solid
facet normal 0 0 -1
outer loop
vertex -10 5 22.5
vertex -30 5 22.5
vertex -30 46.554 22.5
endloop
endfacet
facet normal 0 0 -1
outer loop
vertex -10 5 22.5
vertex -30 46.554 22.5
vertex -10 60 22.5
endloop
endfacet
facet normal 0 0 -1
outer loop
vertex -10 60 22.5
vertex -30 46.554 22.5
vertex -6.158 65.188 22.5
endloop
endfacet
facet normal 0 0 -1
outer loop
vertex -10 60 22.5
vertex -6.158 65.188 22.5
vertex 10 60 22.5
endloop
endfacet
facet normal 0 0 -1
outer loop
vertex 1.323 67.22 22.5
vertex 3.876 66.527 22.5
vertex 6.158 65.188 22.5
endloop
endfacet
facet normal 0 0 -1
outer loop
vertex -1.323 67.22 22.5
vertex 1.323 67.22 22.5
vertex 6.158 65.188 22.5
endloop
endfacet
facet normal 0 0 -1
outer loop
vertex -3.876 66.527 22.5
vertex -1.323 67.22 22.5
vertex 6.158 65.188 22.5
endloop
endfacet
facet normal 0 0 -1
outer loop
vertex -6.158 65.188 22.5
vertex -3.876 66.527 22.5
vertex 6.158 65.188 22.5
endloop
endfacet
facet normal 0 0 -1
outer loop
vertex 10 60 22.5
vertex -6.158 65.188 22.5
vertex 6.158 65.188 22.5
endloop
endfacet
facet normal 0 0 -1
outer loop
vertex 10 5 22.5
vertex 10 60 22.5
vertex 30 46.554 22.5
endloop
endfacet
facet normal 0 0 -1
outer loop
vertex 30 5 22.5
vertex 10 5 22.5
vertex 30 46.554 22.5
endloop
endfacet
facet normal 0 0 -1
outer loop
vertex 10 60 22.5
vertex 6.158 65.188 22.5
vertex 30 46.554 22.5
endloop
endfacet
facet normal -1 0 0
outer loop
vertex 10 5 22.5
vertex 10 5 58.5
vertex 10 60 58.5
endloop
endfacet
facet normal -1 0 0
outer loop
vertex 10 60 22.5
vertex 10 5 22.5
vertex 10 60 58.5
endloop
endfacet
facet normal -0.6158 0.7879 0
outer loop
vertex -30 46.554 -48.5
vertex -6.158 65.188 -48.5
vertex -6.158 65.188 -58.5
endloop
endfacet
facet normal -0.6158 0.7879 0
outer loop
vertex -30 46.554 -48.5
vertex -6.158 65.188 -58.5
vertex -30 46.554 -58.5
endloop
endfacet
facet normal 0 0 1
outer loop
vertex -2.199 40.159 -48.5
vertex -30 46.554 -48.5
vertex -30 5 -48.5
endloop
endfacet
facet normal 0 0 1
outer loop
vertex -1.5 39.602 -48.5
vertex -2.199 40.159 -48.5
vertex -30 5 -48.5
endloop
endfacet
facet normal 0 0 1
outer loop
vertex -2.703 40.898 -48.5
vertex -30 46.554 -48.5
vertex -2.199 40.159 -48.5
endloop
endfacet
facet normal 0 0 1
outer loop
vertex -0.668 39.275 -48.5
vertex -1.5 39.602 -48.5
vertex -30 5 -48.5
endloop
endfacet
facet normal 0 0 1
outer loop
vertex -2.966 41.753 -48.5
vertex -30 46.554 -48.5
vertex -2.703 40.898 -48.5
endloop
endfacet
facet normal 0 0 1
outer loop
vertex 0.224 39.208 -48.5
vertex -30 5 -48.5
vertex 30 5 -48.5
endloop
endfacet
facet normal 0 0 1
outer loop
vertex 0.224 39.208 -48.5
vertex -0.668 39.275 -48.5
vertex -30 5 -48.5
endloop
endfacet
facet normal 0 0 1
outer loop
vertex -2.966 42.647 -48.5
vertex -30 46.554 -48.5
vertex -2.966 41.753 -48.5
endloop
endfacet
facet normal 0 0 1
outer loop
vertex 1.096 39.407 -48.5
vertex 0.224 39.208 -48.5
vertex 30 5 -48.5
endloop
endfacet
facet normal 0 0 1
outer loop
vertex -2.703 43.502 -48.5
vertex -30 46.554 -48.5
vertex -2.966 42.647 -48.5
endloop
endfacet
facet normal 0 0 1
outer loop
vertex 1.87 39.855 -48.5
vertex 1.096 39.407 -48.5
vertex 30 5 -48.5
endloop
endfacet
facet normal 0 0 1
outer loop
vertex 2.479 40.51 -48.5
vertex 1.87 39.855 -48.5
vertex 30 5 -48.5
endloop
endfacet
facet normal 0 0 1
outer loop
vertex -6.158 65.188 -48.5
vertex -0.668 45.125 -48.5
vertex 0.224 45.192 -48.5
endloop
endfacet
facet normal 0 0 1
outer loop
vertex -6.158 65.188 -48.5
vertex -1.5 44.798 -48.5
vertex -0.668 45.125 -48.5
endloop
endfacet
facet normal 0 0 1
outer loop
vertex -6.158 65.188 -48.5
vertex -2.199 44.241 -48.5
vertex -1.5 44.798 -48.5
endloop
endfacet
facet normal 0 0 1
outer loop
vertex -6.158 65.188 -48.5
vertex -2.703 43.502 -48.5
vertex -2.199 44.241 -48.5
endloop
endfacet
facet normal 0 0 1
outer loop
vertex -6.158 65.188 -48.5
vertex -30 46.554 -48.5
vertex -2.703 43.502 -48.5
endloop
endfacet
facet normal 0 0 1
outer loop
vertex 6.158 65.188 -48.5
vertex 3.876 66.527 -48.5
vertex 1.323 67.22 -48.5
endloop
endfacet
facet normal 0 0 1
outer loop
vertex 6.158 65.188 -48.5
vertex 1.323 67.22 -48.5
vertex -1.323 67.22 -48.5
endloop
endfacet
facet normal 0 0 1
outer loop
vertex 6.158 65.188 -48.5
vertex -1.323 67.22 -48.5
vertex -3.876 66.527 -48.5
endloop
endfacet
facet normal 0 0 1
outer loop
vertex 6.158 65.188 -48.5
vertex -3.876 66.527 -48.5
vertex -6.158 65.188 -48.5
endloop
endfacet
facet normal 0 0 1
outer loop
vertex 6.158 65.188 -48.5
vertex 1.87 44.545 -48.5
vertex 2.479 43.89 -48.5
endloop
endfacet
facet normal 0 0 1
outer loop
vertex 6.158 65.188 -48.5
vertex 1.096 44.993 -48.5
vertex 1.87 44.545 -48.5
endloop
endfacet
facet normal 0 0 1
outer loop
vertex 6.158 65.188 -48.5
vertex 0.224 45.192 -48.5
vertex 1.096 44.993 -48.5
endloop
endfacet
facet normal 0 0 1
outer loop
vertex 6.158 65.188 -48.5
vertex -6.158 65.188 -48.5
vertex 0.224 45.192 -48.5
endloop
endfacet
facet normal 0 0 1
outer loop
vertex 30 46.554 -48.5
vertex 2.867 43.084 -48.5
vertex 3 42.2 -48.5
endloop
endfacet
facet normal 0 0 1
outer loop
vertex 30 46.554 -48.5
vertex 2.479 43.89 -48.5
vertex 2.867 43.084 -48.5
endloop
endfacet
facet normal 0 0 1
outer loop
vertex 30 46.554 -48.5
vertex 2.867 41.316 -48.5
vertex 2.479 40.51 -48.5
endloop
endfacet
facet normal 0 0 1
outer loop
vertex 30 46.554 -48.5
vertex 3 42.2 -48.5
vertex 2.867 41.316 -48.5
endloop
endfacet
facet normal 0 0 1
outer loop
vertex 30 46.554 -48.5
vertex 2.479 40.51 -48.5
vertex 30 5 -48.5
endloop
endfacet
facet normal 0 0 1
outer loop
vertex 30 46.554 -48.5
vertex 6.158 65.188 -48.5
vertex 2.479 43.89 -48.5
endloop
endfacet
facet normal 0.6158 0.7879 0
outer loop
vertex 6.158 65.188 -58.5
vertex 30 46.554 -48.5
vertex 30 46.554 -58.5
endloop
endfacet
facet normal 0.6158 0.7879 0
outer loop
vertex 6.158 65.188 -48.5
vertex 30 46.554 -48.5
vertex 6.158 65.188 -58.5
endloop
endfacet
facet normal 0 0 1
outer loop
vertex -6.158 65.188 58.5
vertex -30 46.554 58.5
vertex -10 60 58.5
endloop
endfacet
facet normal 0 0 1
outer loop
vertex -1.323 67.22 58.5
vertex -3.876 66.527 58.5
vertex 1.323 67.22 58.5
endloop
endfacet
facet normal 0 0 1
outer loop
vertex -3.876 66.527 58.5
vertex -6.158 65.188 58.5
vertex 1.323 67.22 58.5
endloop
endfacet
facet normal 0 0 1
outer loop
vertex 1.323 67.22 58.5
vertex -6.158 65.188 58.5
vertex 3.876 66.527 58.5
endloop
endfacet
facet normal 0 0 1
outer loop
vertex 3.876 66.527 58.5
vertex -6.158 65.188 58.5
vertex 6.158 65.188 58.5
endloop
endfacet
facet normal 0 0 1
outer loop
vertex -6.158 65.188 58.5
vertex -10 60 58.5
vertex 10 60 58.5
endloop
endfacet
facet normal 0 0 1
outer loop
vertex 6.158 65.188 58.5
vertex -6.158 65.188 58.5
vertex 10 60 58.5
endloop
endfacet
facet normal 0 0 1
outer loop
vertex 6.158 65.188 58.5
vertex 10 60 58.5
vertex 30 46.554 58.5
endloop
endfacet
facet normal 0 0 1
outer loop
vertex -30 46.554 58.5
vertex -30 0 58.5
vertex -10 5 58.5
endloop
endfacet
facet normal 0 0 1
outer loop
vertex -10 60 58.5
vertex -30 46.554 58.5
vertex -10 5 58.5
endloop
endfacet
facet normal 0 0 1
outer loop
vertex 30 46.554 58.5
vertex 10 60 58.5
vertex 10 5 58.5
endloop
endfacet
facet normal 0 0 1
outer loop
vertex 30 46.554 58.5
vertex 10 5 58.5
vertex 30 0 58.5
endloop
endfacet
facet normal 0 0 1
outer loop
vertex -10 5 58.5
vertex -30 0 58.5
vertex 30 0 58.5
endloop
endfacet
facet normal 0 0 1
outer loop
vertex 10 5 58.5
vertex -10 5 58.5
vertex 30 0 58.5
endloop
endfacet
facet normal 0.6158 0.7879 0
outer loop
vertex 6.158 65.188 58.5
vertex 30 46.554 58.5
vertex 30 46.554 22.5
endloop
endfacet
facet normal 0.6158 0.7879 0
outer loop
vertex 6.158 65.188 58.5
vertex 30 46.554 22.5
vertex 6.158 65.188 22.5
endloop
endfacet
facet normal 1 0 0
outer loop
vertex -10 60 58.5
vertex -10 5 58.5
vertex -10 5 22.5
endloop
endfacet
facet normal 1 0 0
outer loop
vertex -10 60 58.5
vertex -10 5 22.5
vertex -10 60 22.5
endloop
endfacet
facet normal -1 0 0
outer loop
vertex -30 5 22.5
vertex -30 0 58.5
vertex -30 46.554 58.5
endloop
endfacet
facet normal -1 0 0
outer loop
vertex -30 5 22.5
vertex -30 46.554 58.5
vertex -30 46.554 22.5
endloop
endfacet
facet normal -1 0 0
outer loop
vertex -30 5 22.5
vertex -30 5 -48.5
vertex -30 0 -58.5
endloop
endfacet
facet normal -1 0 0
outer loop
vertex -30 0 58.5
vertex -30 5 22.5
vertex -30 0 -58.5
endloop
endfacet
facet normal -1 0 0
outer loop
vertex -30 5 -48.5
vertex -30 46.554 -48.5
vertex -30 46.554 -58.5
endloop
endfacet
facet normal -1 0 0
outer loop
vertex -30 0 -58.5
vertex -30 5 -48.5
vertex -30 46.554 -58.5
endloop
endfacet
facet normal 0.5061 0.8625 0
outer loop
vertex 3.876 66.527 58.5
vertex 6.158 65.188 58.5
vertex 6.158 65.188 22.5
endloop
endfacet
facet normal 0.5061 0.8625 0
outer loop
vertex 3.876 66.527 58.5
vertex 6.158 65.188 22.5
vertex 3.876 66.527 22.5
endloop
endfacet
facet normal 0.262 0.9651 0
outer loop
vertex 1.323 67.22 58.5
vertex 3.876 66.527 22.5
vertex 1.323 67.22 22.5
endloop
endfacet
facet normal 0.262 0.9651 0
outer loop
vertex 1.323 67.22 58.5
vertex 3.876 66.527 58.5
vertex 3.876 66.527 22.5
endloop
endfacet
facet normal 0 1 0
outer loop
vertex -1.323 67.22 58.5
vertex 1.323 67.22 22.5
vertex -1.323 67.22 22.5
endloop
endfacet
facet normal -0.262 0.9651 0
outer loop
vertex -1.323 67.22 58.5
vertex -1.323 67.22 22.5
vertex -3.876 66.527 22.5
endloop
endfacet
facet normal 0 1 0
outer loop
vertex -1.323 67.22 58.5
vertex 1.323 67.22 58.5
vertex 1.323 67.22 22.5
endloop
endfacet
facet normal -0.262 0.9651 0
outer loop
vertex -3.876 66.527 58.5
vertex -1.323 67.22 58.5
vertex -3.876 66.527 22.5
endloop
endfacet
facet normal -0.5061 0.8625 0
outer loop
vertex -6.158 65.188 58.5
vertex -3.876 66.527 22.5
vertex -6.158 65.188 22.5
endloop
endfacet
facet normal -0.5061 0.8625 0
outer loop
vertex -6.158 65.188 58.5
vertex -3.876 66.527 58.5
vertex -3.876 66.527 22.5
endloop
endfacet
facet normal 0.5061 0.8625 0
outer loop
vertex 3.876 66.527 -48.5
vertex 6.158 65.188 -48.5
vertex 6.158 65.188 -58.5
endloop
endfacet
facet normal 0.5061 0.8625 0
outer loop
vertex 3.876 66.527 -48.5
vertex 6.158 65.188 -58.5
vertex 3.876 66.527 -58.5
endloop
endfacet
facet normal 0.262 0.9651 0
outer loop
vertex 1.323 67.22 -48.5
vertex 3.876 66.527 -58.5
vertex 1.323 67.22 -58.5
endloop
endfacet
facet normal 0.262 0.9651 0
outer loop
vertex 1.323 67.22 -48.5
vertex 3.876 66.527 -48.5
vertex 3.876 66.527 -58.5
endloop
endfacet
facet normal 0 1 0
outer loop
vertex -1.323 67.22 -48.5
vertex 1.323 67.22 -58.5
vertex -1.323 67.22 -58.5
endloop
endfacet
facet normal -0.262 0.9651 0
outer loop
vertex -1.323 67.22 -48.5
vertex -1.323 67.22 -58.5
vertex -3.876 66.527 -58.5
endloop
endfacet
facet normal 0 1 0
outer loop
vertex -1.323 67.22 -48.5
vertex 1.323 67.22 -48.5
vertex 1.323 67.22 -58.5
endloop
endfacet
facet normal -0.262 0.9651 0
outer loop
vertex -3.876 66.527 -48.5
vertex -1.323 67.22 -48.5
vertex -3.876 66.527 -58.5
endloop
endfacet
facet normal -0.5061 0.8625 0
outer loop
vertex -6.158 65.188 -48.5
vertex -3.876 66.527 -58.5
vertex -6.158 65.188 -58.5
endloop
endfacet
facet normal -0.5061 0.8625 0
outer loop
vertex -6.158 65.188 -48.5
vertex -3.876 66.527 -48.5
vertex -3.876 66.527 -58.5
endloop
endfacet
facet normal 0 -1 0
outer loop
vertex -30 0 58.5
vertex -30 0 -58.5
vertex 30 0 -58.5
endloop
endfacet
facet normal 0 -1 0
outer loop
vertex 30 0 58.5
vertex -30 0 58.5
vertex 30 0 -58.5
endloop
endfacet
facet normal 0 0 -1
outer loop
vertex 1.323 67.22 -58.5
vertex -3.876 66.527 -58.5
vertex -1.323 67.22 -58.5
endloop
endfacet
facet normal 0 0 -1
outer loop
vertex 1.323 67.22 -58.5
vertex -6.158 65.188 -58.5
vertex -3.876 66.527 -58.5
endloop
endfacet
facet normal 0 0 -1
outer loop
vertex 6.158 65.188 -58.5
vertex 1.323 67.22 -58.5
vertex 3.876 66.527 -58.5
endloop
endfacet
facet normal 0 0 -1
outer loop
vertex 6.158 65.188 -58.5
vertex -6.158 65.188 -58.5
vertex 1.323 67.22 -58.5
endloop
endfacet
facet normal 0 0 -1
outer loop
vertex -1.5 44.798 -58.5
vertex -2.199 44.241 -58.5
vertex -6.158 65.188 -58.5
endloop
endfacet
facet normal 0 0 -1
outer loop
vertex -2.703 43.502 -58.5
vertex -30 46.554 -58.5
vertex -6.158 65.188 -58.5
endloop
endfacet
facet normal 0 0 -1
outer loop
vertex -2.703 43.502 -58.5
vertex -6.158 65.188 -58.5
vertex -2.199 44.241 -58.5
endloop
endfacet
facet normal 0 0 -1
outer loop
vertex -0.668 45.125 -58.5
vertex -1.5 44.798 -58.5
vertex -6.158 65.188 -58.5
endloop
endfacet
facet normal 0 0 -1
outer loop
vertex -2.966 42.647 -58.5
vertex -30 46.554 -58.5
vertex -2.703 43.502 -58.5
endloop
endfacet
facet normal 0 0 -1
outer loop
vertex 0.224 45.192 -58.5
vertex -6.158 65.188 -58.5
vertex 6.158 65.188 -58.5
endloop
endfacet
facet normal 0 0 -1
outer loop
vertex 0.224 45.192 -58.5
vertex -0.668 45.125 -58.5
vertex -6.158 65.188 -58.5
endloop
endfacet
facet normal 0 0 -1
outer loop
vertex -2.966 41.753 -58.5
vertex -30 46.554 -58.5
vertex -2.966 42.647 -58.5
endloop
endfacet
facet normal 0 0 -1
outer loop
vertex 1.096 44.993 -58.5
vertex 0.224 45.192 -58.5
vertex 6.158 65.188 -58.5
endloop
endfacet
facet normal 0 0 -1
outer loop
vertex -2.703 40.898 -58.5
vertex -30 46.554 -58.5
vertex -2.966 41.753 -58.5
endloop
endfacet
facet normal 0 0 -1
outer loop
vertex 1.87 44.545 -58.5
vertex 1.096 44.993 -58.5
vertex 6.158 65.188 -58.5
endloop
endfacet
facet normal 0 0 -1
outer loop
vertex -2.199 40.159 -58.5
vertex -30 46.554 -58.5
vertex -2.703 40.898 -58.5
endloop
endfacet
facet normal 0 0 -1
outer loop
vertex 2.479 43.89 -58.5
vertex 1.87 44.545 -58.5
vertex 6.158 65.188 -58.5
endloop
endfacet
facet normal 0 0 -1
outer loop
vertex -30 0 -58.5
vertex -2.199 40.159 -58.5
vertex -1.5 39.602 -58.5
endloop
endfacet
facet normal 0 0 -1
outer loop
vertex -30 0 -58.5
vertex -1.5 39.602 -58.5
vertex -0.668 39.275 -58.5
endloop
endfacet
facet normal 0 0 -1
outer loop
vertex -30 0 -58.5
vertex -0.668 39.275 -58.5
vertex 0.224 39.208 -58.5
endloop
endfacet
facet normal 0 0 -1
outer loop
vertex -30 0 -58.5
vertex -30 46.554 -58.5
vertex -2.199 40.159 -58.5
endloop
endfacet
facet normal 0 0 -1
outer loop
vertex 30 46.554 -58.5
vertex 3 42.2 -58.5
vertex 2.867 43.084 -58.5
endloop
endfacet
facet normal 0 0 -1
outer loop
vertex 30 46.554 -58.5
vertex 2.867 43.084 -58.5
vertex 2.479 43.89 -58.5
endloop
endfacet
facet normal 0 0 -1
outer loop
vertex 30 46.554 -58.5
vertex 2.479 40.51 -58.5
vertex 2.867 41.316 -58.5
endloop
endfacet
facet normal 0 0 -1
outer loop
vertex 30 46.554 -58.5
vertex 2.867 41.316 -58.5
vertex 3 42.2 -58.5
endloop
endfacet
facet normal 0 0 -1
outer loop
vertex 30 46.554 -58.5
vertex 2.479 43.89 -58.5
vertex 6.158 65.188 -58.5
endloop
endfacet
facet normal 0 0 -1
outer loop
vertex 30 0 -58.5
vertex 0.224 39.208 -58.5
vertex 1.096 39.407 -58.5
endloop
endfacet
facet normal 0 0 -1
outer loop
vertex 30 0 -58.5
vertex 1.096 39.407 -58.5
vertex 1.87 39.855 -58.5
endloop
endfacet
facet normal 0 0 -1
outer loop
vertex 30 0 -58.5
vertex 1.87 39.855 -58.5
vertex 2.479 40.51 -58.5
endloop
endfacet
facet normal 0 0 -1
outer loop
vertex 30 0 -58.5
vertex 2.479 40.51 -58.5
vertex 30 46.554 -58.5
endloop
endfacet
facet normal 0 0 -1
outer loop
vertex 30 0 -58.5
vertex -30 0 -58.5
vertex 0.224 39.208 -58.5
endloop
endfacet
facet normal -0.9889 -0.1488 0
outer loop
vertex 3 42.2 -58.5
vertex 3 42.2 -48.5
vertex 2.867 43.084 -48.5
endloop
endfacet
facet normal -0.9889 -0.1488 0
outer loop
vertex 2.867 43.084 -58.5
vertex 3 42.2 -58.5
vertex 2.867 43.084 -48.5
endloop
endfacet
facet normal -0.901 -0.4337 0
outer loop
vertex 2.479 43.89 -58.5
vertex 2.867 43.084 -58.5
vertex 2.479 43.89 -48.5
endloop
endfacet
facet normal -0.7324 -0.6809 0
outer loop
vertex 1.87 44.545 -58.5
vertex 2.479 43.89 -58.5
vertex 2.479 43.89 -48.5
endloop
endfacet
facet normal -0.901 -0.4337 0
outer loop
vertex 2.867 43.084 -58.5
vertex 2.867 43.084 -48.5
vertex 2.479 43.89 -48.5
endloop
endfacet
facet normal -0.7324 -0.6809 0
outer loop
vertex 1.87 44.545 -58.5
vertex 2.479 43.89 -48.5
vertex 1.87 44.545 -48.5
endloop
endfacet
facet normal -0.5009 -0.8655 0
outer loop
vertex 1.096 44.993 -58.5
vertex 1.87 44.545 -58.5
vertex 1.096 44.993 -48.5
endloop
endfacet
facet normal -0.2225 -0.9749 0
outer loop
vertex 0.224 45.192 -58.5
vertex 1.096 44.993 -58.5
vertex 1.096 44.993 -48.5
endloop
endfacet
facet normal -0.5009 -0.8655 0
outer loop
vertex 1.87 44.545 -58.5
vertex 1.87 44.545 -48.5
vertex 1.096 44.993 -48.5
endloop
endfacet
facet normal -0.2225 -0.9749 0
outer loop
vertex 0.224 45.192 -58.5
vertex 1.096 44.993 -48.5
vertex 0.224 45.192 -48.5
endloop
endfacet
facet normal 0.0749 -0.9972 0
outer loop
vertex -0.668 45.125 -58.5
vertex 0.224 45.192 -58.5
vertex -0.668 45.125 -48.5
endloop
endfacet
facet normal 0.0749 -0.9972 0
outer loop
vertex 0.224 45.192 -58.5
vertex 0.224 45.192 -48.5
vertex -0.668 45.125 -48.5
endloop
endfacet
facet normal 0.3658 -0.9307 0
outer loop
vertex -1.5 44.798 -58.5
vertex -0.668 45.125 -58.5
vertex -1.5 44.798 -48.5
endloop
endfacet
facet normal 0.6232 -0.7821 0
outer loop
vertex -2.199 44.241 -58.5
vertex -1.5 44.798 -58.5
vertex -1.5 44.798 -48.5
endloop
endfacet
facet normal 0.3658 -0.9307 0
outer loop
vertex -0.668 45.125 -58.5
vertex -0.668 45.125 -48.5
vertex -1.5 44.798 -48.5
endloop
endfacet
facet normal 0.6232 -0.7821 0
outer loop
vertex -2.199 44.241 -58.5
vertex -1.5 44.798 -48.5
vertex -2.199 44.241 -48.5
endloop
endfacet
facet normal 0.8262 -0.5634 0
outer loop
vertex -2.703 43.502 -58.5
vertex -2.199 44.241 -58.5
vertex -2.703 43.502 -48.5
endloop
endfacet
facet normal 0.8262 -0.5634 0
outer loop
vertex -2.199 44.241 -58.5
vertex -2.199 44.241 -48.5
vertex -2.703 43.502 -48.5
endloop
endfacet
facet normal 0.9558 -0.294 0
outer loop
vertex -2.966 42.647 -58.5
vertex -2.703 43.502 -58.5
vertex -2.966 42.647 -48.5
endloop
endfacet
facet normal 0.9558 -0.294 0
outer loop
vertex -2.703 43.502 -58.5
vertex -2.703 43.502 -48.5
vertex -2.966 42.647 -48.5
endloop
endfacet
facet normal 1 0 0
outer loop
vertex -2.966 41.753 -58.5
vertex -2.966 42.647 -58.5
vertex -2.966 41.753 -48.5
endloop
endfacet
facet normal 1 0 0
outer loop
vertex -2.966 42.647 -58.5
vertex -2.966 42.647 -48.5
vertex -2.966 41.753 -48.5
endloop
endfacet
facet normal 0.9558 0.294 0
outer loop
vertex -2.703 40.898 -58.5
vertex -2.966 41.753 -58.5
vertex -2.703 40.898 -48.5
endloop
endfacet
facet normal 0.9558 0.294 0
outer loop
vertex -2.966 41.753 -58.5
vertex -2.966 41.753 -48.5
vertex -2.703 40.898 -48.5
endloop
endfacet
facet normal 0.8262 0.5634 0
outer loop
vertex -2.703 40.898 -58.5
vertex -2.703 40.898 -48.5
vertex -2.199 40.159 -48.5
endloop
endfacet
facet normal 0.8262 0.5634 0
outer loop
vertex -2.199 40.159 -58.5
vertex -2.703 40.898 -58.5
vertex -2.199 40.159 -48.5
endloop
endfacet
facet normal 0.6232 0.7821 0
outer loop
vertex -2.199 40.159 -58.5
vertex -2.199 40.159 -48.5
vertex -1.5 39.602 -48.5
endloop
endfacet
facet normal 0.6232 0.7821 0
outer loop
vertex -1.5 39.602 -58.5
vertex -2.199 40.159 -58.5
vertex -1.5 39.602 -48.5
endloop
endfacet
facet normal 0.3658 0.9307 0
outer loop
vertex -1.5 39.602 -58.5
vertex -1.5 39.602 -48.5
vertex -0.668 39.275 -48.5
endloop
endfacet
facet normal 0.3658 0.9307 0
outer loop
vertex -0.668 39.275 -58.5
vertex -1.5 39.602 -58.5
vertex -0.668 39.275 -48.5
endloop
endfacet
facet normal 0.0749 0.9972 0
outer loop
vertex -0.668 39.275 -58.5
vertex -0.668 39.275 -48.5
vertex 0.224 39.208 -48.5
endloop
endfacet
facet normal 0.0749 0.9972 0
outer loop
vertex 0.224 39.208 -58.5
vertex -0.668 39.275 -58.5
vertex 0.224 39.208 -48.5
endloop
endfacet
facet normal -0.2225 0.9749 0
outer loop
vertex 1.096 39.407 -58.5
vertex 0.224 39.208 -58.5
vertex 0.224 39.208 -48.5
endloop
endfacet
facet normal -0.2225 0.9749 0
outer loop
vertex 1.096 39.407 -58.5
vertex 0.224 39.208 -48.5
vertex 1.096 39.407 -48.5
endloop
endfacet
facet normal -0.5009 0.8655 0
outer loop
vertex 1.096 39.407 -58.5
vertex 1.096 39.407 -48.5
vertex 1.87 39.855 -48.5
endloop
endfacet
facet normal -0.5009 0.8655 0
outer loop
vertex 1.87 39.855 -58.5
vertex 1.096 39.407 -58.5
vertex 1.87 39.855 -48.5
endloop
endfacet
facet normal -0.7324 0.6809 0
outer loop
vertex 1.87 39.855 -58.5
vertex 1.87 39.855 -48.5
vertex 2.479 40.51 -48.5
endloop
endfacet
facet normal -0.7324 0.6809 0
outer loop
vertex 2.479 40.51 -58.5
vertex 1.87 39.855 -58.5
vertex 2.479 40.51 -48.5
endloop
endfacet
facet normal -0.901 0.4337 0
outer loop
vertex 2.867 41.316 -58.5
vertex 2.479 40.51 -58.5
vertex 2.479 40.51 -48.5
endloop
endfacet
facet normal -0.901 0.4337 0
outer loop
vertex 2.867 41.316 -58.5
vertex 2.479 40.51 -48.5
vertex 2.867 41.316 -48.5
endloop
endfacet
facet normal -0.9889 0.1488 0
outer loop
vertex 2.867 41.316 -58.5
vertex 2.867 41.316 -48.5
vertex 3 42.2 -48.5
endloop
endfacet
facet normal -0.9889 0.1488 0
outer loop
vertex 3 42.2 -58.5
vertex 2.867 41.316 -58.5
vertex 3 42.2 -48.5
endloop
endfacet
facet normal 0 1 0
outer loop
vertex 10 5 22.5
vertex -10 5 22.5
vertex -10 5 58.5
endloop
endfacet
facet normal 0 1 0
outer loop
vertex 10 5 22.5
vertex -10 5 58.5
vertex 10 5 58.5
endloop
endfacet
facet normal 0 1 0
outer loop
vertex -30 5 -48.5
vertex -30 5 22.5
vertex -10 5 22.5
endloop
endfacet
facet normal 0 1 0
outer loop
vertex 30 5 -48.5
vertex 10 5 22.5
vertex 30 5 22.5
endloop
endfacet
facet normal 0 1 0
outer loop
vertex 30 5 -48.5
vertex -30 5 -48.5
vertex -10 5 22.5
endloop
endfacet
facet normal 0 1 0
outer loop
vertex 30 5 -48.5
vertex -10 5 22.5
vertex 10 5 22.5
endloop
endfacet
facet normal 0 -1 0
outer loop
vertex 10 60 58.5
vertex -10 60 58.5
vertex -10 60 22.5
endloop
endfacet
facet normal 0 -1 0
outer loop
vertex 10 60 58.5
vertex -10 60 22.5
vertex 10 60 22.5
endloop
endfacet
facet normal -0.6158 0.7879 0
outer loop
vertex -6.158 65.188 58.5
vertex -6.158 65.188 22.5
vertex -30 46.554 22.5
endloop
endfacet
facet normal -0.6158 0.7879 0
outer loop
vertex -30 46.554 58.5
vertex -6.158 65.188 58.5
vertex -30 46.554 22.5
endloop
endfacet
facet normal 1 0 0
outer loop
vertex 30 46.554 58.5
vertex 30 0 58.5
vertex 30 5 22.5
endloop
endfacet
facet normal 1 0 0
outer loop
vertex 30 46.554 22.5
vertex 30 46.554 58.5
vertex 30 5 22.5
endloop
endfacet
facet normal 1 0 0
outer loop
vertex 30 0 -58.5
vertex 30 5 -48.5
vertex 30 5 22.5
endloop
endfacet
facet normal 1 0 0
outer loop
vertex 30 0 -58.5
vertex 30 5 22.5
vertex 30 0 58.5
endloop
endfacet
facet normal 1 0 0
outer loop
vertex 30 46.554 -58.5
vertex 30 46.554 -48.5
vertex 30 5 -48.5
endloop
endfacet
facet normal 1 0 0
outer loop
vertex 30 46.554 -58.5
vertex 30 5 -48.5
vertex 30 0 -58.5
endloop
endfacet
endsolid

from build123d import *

# Parameters (mm, degrees)
SKETCH2_W           = 80
SKETCH2_H           = 117
BOSS_EXTRUDE1_DEPTH = 70
SKETCH3_W           = 80
SKETCH3_H           = 71
CUT_EXTRUDE1_DEPTH  = 65
SKETCH4_W           = 20
SKETCH4_H           = 55
CUT_EXTRUDE2_DEPTH  = 65
CUT_EXTRUDE3_DEPTH  = 143.088000901
SKETCH6_R           = 3
CUT_EXTRUDE4_DEPTH  = 65
SKETCH8_W           = 10
SKETCH8_H           = 117
CUT_EXTRUDE5_DEPTH  = 98.731980436


with BuildPart() as part:
    # Sketch2 → Boss-Extrude1 (new body)
    with BuildSketch(Plane(origin=(0, 0, 0), x_dir=(1, 0, 0), z_dir=(0, 1, 0))):
        Rectangle(SKETCH2_W, SKETCH2_H)
    extrude(amount=BOSS_EXTRUDE1_DEPTH)

    # Sketch3 → Cut-Extrude1 (cut)
    with BuildSketch(Plane(origin=(0, 70, 0), x_dir=(1, 0, 0), z_dir=(0, 1, 0))):
        with Locations((0, 13)):
            Rectangle(SKETCH3_W, SKETCH3_H)
    extrude(amount=-CUT_EXTRUDE1_DEPTH, mode=Mode.SUBTRACT)

    # Sketch4 → Cut-Extrude2 (cut)
    with BuildSketch(Plane.XY.offset(58.5)):
        with Locations((0, 32.5)):
            Rectangle(SKETCH4_W, SKETCH4_H)
    extrude(amount=-CUT_EXTRUDE2_DEPTH, mode=Mode.SUBTRACT)

    # Sketch5 → Cut-Extrude3 (cut, through all)
    with BuildSketch(Plane.XY.offset(58.5)):
        with BuildLine():
            Line((-6.157789331, 65.187529324), (-40, 38.738971621))
            Line((-40, 38.738971621), (-40, 70))
            Line((-40, 70), (40, 70))
            Line((40, 70), (40, 38.738971621))
            Line((40, 38.738971621), (6.157789331, 65.187529324))
            ThreePointArc((6.157789331, 65.187529324), (0, 67.30833961), (-6.157789331, 65.187529324))
        make_face()
    extrude(amount=-CUT_EXTRUDE3_DEPTH, mode=Mode.SUBTRACT)

    # Sketch6 → Cut-Extrude4 (cut)
    with BuildSketch(Plane.XY.offset(-48.5)):
        with Locations((0, 42.2)):
            Circle(SKETCH6_R)
    extrude(amount=-CUT_EXTRUDE4_DEPTH, mode=Mode.SUBTRACT)

    # Sketch8 → Cut-Extrude5 (cut, through all)
    with BuildSketch(Plane(origin=(0, 67.3, 0), x_dir=(1, 0, 0), z_dir=(0, 1, 0))):
        with Locations((-35, 0)):
            Rectangle(SKETCH8_W, SKETCH8_H)
        with Locations((35, 0)):
            Rectangle(SKETCH8_W, SKETCH8_H)
    extrude(amount=-CUT_EXTRUDE5_DEPTH, mode=Mode.SUBTRACT)


solid = part.part
